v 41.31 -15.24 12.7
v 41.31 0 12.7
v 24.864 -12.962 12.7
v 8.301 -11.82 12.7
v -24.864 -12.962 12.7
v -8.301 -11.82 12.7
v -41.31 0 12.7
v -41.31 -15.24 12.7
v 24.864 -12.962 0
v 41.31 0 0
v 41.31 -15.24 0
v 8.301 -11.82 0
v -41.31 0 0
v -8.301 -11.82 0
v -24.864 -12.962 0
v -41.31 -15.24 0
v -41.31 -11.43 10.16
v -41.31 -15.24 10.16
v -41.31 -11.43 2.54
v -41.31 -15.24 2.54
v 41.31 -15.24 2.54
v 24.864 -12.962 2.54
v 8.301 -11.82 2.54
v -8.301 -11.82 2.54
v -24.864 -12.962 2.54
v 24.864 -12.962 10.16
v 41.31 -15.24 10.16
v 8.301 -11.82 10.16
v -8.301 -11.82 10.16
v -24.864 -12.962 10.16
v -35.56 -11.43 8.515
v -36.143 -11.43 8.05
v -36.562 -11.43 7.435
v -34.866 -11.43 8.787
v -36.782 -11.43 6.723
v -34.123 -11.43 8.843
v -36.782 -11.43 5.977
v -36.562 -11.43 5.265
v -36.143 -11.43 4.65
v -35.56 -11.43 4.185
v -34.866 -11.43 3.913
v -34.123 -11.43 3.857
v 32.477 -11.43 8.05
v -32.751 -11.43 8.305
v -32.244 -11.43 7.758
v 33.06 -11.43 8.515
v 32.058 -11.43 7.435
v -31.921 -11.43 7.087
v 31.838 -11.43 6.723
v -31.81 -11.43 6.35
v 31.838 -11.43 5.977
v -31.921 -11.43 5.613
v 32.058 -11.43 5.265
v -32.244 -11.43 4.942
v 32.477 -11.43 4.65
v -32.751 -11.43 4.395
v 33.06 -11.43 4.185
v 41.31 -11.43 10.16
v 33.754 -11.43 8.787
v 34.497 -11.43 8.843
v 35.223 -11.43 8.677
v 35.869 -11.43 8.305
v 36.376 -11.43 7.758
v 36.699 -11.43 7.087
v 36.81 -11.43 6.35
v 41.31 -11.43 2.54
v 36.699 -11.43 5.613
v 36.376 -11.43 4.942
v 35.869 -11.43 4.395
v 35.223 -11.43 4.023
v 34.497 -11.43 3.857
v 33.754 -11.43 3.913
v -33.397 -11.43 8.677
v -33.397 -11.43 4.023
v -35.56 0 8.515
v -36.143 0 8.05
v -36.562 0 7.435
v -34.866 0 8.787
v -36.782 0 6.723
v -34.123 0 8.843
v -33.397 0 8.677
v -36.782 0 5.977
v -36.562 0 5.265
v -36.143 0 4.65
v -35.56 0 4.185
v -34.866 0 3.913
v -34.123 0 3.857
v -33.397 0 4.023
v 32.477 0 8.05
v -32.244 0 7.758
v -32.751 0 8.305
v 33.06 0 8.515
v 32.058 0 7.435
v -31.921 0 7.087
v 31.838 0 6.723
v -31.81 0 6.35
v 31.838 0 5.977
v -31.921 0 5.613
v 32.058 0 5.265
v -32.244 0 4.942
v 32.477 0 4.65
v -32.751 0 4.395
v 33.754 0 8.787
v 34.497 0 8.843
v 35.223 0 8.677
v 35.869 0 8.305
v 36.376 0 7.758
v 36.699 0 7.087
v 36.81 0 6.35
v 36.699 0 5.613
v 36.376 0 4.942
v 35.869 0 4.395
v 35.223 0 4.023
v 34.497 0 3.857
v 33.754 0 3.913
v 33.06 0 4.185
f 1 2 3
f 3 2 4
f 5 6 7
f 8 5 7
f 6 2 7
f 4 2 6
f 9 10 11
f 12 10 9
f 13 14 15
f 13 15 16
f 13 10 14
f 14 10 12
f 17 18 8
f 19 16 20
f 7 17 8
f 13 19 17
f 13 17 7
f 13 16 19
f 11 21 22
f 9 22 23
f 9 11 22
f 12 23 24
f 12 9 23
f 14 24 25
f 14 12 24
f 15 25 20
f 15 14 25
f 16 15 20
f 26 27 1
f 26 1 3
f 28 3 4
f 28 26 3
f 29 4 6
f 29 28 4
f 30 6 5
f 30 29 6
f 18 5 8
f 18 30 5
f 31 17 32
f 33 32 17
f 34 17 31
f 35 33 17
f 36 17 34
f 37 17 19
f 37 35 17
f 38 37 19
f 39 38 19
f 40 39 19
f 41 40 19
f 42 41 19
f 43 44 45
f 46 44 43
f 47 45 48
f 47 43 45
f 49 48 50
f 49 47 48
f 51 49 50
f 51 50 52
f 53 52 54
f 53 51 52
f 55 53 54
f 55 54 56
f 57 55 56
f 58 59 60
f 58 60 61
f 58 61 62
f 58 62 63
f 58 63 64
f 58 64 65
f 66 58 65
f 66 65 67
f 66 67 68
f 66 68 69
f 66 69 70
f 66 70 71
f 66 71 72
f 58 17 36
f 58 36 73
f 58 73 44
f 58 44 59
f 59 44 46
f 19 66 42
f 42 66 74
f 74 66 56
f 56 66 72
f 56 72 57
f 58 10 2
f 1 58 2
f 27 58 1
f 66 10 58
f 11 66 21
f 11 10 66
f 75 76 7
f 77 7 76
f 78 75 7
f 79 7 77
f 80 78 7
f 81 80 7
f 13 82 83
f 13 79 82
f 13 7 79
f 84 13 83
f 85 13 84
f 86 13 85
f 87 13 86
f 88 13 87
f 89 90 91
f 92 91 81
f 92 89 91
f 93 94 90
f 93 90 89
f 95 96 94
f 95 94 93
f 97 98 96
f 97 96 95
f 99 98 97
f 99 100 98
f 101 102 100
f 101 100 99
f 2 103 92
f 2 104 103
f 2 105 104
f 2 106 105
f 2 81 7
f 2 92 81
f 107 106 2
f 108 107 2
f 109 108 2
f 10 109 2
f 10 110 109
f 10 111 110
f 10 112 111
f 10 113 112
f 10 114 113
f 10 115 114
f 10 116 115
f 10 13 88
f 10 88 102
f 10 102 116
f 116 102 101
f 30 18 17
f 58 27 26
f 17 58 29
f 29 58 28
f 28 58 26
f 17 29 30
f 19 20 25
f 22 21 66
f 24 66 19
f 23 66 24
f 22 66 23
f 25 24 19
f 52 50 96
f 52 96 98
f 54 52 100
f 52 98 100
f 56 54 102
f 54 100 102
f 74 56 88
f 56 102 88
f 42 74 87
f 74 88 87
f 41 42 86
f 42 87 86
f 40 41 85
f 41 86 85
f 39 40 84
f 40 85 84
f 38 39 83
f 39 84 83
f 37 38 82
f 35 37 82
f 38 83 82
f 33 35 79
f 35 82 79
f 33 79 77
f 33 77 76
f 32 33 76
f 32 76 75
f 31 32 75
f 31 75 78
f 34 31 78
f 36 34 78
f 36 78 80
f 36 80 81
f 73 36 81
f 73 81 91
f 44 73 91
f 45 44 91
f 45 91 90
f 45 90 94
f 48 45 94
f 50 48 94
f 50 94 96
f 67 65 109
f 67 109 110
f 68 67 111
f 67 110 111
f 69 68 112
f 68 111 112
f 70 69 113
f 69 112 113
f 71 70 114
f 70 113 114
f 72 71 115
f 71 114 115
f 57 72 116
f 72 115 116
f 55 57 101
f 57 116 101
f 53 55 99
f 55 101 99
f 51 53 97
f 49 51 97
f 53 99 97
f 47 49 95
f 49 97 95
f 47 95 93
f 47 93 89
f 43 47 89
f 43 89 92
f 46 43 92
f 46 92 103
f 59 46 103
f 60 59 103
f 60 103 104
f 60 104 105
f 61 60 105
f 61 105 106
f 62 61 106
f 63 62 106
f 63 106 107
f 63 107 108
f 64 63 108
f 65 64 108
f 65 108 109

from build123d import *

# Parameters (mm, degrees)
BOSS_EXTRUDE1_DEPTH = 12.7
SKETCH2_R           = 2.5
CUT_EXTRUDE1_DEPTH  = 16.24
SKETCH3_W           = 7.62
SKETCH3_H           = 3.81
CUT_EXTRUDE2_DEPTH  = 83.6200001


with BuildPart() as part:
    # Sketch1 → Boss-Extrude1 (new body)
    with BuildSketch(Plane.XY):
        with BuildLine():
            Line((-41.31, 0), (41.31, 0))
            Line((41.31, 0), (41.31, -15.24))
            ThreePointArc((41.31, -15.24), (0, -11.677615661), (-41.31, -15.24))
            Line((-41.31, -15.24), (-41.31, 0))
        make_face()
    extrude(amount=BOSS_EXTRUDE1_DEPTH)

    # Sketch2 → Cut-Extrude1 (cut, through all)
    with BuildSketch(Plane(origin=(0, 0, 0), x_dir=(1, 0, 0), z_dir=(0, 1, 0))):
        with Locations((-34.31, -6.35)):
            Circle(SKETCH2_R)
        with Locations((34.31, -6.35)):
            Circle(SKETCH2_R)
    extrude(amount=-CUT_EXTRUDE1_DEPTH, mode=Mode.SUBTRACT)

    # Sketch3 → Cut-Extrude2 (cut, through all)
    with BuildSketch(Plane(origin=(41.31, 0, 0), x_dir=(0, 0, -1), z_dir=(1, 0, 0))):
        with Locations((-6.35, -13.335)):
            Rectangle(SKETCH3_W, SKETCH3_H)
    extrude(amount=-CUT_EXTRUDE2_DEPTH, mode=Mode.SUBTRACT)


solid = part.part
